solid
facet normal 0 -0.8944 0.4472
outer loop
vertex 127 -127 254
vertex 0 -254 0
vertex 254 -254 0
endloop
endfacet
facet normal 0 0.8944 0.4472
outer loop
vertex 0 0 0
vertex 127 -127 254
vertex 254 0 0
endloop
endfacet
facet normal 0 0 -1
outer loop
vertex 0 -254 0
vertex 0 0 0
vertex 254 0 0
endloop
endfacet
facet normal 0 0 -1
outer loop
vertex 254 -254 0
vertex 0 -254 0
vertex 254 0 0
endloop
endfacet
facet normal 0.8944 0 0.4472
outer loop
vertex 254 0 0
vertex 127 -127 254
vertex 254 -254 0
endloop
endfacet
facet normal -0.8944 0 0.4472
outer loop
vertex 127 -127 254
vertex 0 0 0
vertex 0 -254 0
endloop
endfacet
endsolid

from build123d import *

# Parameters (mm, degrees)
F0_W      = 254
F0_H      = 254
F1_DEPTH  = 254
F6_DEPTH  = 254
F8_DEPTH  = 254
F4_DEPTH  = 254.000008
F10_DEPTH = 254


with BuildPart() as f1:
    # F0 (on Front) → F1 (new body)
    with BuildSketch(Plane.XZ):
        with Locations((127, 127)):
            Rectangle(F0_W, F0_H)
    extrude(amount=F1_DEPTH)

    # F2 (on Front) → F6 (cut, through all)
    with BuildSketch(Plane.XZ):
        Polygon((0, 0), (127, 254), (0, 254), align=None)
    extrude(amount=F6_DEPTH, mode=Mode.SUBTRACT)

    # F7 (on Front) → F8 (cut, through all)
    with BuildSketch(Plane.XZ):
        Polygon((254, 254), (127, 254), (254, 0), align=None)
    extrude(amount=F8_DEPTH, mode=Mode.SUBTRACT)

    # F9 (on Right) → F4 (cut)
    with BuildSketch(Plane.YZ):
        Polygon((-254, 254), (-254, 0), (-127, 254), align=None)
    extrude(amount=F4_DEPTH, mode=Mode.SUBTRACT)

    # F5 (on Right) → F10 (cut)
    with BuildSketch(Plane.YZ):
        Polygon((0, 254), (-127, 254), (0, 0), align=None)
    extrude(amount=F10_DEPTH, mode=Mode.SUBTRACT)


solid = f1.part
